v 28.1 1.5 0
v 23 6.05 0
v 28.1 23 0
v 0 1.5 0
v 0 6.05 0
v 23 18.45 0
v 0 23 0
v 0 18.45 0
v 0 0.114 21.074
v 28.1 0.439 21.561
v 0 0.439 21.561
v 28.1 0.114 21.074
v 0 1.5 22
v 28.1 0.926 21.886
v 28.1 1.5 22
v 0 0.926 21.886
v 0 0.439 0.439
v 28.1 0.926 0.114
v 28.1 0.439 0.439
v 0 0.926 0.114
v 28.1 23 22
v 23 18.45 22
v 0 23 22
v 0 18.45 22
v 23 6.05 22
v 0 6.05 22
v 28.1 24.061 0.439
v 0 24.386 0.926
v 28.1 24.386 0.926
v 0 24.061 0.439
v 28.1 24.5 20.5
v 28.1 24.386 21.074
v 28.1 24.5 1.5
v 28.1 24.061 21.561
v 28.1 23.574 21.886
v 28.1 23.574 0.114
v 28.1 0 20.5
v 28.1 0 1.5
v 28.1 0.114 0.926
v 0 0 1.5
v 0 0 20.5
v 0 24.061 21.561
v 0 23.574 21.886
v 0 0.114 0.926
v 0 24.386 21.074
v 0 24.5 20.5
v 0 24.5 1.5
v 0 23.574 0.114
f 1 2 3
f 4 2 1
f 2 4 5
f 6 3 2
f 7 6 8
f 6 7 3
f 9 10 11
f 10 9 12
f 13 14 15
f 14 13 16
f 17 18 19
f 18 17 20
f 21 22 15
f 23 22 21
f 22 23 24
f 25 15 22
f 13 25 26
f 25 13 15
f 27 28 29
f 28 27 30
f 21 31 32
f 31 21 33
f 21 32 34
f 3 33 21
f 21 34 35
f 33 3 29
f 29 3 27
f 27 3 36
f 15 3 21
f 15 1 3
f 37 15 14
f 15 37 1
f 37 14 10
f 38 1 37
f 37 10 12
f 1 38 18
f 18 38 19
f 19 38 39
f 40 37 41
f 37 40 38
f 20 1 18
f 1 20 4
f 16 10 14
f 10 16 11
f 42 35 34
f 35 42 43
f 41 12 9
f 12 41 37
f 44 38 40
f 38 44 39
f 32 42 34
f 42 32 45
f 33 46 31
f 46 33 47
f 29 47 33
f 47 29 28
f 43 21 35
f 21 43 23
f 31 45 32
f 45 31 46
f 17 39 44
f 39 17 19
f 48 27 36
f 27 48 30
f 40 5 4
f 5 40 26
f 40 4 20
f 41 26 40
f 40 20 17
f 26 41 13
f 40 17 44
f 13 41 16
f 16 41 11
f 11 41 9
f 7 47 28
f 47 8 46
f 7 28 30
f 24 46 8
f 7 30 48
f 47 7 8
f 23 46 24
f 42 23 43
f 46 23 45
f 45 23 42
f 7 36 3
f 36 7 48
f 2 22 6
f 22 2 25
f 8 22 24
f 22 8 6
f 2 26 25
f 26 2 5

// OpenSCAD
outer = [28,24.5,22];
softcorner=3;
servo=[23,12.4,23];

difference() {
    translate([0,softcorner/2,softcorner/2]) {
        minkowski() {
            cube(outer-[0,softcorner,softcorner]);
            rotate([0,90,0]) {
                cylinder(d=softcorner,h=0.1,$fn=16);
            }
        }
    }
    translate([0,(outer[1] - servo[1]) /2,0]) {
        #cube(servo);
    }
}
